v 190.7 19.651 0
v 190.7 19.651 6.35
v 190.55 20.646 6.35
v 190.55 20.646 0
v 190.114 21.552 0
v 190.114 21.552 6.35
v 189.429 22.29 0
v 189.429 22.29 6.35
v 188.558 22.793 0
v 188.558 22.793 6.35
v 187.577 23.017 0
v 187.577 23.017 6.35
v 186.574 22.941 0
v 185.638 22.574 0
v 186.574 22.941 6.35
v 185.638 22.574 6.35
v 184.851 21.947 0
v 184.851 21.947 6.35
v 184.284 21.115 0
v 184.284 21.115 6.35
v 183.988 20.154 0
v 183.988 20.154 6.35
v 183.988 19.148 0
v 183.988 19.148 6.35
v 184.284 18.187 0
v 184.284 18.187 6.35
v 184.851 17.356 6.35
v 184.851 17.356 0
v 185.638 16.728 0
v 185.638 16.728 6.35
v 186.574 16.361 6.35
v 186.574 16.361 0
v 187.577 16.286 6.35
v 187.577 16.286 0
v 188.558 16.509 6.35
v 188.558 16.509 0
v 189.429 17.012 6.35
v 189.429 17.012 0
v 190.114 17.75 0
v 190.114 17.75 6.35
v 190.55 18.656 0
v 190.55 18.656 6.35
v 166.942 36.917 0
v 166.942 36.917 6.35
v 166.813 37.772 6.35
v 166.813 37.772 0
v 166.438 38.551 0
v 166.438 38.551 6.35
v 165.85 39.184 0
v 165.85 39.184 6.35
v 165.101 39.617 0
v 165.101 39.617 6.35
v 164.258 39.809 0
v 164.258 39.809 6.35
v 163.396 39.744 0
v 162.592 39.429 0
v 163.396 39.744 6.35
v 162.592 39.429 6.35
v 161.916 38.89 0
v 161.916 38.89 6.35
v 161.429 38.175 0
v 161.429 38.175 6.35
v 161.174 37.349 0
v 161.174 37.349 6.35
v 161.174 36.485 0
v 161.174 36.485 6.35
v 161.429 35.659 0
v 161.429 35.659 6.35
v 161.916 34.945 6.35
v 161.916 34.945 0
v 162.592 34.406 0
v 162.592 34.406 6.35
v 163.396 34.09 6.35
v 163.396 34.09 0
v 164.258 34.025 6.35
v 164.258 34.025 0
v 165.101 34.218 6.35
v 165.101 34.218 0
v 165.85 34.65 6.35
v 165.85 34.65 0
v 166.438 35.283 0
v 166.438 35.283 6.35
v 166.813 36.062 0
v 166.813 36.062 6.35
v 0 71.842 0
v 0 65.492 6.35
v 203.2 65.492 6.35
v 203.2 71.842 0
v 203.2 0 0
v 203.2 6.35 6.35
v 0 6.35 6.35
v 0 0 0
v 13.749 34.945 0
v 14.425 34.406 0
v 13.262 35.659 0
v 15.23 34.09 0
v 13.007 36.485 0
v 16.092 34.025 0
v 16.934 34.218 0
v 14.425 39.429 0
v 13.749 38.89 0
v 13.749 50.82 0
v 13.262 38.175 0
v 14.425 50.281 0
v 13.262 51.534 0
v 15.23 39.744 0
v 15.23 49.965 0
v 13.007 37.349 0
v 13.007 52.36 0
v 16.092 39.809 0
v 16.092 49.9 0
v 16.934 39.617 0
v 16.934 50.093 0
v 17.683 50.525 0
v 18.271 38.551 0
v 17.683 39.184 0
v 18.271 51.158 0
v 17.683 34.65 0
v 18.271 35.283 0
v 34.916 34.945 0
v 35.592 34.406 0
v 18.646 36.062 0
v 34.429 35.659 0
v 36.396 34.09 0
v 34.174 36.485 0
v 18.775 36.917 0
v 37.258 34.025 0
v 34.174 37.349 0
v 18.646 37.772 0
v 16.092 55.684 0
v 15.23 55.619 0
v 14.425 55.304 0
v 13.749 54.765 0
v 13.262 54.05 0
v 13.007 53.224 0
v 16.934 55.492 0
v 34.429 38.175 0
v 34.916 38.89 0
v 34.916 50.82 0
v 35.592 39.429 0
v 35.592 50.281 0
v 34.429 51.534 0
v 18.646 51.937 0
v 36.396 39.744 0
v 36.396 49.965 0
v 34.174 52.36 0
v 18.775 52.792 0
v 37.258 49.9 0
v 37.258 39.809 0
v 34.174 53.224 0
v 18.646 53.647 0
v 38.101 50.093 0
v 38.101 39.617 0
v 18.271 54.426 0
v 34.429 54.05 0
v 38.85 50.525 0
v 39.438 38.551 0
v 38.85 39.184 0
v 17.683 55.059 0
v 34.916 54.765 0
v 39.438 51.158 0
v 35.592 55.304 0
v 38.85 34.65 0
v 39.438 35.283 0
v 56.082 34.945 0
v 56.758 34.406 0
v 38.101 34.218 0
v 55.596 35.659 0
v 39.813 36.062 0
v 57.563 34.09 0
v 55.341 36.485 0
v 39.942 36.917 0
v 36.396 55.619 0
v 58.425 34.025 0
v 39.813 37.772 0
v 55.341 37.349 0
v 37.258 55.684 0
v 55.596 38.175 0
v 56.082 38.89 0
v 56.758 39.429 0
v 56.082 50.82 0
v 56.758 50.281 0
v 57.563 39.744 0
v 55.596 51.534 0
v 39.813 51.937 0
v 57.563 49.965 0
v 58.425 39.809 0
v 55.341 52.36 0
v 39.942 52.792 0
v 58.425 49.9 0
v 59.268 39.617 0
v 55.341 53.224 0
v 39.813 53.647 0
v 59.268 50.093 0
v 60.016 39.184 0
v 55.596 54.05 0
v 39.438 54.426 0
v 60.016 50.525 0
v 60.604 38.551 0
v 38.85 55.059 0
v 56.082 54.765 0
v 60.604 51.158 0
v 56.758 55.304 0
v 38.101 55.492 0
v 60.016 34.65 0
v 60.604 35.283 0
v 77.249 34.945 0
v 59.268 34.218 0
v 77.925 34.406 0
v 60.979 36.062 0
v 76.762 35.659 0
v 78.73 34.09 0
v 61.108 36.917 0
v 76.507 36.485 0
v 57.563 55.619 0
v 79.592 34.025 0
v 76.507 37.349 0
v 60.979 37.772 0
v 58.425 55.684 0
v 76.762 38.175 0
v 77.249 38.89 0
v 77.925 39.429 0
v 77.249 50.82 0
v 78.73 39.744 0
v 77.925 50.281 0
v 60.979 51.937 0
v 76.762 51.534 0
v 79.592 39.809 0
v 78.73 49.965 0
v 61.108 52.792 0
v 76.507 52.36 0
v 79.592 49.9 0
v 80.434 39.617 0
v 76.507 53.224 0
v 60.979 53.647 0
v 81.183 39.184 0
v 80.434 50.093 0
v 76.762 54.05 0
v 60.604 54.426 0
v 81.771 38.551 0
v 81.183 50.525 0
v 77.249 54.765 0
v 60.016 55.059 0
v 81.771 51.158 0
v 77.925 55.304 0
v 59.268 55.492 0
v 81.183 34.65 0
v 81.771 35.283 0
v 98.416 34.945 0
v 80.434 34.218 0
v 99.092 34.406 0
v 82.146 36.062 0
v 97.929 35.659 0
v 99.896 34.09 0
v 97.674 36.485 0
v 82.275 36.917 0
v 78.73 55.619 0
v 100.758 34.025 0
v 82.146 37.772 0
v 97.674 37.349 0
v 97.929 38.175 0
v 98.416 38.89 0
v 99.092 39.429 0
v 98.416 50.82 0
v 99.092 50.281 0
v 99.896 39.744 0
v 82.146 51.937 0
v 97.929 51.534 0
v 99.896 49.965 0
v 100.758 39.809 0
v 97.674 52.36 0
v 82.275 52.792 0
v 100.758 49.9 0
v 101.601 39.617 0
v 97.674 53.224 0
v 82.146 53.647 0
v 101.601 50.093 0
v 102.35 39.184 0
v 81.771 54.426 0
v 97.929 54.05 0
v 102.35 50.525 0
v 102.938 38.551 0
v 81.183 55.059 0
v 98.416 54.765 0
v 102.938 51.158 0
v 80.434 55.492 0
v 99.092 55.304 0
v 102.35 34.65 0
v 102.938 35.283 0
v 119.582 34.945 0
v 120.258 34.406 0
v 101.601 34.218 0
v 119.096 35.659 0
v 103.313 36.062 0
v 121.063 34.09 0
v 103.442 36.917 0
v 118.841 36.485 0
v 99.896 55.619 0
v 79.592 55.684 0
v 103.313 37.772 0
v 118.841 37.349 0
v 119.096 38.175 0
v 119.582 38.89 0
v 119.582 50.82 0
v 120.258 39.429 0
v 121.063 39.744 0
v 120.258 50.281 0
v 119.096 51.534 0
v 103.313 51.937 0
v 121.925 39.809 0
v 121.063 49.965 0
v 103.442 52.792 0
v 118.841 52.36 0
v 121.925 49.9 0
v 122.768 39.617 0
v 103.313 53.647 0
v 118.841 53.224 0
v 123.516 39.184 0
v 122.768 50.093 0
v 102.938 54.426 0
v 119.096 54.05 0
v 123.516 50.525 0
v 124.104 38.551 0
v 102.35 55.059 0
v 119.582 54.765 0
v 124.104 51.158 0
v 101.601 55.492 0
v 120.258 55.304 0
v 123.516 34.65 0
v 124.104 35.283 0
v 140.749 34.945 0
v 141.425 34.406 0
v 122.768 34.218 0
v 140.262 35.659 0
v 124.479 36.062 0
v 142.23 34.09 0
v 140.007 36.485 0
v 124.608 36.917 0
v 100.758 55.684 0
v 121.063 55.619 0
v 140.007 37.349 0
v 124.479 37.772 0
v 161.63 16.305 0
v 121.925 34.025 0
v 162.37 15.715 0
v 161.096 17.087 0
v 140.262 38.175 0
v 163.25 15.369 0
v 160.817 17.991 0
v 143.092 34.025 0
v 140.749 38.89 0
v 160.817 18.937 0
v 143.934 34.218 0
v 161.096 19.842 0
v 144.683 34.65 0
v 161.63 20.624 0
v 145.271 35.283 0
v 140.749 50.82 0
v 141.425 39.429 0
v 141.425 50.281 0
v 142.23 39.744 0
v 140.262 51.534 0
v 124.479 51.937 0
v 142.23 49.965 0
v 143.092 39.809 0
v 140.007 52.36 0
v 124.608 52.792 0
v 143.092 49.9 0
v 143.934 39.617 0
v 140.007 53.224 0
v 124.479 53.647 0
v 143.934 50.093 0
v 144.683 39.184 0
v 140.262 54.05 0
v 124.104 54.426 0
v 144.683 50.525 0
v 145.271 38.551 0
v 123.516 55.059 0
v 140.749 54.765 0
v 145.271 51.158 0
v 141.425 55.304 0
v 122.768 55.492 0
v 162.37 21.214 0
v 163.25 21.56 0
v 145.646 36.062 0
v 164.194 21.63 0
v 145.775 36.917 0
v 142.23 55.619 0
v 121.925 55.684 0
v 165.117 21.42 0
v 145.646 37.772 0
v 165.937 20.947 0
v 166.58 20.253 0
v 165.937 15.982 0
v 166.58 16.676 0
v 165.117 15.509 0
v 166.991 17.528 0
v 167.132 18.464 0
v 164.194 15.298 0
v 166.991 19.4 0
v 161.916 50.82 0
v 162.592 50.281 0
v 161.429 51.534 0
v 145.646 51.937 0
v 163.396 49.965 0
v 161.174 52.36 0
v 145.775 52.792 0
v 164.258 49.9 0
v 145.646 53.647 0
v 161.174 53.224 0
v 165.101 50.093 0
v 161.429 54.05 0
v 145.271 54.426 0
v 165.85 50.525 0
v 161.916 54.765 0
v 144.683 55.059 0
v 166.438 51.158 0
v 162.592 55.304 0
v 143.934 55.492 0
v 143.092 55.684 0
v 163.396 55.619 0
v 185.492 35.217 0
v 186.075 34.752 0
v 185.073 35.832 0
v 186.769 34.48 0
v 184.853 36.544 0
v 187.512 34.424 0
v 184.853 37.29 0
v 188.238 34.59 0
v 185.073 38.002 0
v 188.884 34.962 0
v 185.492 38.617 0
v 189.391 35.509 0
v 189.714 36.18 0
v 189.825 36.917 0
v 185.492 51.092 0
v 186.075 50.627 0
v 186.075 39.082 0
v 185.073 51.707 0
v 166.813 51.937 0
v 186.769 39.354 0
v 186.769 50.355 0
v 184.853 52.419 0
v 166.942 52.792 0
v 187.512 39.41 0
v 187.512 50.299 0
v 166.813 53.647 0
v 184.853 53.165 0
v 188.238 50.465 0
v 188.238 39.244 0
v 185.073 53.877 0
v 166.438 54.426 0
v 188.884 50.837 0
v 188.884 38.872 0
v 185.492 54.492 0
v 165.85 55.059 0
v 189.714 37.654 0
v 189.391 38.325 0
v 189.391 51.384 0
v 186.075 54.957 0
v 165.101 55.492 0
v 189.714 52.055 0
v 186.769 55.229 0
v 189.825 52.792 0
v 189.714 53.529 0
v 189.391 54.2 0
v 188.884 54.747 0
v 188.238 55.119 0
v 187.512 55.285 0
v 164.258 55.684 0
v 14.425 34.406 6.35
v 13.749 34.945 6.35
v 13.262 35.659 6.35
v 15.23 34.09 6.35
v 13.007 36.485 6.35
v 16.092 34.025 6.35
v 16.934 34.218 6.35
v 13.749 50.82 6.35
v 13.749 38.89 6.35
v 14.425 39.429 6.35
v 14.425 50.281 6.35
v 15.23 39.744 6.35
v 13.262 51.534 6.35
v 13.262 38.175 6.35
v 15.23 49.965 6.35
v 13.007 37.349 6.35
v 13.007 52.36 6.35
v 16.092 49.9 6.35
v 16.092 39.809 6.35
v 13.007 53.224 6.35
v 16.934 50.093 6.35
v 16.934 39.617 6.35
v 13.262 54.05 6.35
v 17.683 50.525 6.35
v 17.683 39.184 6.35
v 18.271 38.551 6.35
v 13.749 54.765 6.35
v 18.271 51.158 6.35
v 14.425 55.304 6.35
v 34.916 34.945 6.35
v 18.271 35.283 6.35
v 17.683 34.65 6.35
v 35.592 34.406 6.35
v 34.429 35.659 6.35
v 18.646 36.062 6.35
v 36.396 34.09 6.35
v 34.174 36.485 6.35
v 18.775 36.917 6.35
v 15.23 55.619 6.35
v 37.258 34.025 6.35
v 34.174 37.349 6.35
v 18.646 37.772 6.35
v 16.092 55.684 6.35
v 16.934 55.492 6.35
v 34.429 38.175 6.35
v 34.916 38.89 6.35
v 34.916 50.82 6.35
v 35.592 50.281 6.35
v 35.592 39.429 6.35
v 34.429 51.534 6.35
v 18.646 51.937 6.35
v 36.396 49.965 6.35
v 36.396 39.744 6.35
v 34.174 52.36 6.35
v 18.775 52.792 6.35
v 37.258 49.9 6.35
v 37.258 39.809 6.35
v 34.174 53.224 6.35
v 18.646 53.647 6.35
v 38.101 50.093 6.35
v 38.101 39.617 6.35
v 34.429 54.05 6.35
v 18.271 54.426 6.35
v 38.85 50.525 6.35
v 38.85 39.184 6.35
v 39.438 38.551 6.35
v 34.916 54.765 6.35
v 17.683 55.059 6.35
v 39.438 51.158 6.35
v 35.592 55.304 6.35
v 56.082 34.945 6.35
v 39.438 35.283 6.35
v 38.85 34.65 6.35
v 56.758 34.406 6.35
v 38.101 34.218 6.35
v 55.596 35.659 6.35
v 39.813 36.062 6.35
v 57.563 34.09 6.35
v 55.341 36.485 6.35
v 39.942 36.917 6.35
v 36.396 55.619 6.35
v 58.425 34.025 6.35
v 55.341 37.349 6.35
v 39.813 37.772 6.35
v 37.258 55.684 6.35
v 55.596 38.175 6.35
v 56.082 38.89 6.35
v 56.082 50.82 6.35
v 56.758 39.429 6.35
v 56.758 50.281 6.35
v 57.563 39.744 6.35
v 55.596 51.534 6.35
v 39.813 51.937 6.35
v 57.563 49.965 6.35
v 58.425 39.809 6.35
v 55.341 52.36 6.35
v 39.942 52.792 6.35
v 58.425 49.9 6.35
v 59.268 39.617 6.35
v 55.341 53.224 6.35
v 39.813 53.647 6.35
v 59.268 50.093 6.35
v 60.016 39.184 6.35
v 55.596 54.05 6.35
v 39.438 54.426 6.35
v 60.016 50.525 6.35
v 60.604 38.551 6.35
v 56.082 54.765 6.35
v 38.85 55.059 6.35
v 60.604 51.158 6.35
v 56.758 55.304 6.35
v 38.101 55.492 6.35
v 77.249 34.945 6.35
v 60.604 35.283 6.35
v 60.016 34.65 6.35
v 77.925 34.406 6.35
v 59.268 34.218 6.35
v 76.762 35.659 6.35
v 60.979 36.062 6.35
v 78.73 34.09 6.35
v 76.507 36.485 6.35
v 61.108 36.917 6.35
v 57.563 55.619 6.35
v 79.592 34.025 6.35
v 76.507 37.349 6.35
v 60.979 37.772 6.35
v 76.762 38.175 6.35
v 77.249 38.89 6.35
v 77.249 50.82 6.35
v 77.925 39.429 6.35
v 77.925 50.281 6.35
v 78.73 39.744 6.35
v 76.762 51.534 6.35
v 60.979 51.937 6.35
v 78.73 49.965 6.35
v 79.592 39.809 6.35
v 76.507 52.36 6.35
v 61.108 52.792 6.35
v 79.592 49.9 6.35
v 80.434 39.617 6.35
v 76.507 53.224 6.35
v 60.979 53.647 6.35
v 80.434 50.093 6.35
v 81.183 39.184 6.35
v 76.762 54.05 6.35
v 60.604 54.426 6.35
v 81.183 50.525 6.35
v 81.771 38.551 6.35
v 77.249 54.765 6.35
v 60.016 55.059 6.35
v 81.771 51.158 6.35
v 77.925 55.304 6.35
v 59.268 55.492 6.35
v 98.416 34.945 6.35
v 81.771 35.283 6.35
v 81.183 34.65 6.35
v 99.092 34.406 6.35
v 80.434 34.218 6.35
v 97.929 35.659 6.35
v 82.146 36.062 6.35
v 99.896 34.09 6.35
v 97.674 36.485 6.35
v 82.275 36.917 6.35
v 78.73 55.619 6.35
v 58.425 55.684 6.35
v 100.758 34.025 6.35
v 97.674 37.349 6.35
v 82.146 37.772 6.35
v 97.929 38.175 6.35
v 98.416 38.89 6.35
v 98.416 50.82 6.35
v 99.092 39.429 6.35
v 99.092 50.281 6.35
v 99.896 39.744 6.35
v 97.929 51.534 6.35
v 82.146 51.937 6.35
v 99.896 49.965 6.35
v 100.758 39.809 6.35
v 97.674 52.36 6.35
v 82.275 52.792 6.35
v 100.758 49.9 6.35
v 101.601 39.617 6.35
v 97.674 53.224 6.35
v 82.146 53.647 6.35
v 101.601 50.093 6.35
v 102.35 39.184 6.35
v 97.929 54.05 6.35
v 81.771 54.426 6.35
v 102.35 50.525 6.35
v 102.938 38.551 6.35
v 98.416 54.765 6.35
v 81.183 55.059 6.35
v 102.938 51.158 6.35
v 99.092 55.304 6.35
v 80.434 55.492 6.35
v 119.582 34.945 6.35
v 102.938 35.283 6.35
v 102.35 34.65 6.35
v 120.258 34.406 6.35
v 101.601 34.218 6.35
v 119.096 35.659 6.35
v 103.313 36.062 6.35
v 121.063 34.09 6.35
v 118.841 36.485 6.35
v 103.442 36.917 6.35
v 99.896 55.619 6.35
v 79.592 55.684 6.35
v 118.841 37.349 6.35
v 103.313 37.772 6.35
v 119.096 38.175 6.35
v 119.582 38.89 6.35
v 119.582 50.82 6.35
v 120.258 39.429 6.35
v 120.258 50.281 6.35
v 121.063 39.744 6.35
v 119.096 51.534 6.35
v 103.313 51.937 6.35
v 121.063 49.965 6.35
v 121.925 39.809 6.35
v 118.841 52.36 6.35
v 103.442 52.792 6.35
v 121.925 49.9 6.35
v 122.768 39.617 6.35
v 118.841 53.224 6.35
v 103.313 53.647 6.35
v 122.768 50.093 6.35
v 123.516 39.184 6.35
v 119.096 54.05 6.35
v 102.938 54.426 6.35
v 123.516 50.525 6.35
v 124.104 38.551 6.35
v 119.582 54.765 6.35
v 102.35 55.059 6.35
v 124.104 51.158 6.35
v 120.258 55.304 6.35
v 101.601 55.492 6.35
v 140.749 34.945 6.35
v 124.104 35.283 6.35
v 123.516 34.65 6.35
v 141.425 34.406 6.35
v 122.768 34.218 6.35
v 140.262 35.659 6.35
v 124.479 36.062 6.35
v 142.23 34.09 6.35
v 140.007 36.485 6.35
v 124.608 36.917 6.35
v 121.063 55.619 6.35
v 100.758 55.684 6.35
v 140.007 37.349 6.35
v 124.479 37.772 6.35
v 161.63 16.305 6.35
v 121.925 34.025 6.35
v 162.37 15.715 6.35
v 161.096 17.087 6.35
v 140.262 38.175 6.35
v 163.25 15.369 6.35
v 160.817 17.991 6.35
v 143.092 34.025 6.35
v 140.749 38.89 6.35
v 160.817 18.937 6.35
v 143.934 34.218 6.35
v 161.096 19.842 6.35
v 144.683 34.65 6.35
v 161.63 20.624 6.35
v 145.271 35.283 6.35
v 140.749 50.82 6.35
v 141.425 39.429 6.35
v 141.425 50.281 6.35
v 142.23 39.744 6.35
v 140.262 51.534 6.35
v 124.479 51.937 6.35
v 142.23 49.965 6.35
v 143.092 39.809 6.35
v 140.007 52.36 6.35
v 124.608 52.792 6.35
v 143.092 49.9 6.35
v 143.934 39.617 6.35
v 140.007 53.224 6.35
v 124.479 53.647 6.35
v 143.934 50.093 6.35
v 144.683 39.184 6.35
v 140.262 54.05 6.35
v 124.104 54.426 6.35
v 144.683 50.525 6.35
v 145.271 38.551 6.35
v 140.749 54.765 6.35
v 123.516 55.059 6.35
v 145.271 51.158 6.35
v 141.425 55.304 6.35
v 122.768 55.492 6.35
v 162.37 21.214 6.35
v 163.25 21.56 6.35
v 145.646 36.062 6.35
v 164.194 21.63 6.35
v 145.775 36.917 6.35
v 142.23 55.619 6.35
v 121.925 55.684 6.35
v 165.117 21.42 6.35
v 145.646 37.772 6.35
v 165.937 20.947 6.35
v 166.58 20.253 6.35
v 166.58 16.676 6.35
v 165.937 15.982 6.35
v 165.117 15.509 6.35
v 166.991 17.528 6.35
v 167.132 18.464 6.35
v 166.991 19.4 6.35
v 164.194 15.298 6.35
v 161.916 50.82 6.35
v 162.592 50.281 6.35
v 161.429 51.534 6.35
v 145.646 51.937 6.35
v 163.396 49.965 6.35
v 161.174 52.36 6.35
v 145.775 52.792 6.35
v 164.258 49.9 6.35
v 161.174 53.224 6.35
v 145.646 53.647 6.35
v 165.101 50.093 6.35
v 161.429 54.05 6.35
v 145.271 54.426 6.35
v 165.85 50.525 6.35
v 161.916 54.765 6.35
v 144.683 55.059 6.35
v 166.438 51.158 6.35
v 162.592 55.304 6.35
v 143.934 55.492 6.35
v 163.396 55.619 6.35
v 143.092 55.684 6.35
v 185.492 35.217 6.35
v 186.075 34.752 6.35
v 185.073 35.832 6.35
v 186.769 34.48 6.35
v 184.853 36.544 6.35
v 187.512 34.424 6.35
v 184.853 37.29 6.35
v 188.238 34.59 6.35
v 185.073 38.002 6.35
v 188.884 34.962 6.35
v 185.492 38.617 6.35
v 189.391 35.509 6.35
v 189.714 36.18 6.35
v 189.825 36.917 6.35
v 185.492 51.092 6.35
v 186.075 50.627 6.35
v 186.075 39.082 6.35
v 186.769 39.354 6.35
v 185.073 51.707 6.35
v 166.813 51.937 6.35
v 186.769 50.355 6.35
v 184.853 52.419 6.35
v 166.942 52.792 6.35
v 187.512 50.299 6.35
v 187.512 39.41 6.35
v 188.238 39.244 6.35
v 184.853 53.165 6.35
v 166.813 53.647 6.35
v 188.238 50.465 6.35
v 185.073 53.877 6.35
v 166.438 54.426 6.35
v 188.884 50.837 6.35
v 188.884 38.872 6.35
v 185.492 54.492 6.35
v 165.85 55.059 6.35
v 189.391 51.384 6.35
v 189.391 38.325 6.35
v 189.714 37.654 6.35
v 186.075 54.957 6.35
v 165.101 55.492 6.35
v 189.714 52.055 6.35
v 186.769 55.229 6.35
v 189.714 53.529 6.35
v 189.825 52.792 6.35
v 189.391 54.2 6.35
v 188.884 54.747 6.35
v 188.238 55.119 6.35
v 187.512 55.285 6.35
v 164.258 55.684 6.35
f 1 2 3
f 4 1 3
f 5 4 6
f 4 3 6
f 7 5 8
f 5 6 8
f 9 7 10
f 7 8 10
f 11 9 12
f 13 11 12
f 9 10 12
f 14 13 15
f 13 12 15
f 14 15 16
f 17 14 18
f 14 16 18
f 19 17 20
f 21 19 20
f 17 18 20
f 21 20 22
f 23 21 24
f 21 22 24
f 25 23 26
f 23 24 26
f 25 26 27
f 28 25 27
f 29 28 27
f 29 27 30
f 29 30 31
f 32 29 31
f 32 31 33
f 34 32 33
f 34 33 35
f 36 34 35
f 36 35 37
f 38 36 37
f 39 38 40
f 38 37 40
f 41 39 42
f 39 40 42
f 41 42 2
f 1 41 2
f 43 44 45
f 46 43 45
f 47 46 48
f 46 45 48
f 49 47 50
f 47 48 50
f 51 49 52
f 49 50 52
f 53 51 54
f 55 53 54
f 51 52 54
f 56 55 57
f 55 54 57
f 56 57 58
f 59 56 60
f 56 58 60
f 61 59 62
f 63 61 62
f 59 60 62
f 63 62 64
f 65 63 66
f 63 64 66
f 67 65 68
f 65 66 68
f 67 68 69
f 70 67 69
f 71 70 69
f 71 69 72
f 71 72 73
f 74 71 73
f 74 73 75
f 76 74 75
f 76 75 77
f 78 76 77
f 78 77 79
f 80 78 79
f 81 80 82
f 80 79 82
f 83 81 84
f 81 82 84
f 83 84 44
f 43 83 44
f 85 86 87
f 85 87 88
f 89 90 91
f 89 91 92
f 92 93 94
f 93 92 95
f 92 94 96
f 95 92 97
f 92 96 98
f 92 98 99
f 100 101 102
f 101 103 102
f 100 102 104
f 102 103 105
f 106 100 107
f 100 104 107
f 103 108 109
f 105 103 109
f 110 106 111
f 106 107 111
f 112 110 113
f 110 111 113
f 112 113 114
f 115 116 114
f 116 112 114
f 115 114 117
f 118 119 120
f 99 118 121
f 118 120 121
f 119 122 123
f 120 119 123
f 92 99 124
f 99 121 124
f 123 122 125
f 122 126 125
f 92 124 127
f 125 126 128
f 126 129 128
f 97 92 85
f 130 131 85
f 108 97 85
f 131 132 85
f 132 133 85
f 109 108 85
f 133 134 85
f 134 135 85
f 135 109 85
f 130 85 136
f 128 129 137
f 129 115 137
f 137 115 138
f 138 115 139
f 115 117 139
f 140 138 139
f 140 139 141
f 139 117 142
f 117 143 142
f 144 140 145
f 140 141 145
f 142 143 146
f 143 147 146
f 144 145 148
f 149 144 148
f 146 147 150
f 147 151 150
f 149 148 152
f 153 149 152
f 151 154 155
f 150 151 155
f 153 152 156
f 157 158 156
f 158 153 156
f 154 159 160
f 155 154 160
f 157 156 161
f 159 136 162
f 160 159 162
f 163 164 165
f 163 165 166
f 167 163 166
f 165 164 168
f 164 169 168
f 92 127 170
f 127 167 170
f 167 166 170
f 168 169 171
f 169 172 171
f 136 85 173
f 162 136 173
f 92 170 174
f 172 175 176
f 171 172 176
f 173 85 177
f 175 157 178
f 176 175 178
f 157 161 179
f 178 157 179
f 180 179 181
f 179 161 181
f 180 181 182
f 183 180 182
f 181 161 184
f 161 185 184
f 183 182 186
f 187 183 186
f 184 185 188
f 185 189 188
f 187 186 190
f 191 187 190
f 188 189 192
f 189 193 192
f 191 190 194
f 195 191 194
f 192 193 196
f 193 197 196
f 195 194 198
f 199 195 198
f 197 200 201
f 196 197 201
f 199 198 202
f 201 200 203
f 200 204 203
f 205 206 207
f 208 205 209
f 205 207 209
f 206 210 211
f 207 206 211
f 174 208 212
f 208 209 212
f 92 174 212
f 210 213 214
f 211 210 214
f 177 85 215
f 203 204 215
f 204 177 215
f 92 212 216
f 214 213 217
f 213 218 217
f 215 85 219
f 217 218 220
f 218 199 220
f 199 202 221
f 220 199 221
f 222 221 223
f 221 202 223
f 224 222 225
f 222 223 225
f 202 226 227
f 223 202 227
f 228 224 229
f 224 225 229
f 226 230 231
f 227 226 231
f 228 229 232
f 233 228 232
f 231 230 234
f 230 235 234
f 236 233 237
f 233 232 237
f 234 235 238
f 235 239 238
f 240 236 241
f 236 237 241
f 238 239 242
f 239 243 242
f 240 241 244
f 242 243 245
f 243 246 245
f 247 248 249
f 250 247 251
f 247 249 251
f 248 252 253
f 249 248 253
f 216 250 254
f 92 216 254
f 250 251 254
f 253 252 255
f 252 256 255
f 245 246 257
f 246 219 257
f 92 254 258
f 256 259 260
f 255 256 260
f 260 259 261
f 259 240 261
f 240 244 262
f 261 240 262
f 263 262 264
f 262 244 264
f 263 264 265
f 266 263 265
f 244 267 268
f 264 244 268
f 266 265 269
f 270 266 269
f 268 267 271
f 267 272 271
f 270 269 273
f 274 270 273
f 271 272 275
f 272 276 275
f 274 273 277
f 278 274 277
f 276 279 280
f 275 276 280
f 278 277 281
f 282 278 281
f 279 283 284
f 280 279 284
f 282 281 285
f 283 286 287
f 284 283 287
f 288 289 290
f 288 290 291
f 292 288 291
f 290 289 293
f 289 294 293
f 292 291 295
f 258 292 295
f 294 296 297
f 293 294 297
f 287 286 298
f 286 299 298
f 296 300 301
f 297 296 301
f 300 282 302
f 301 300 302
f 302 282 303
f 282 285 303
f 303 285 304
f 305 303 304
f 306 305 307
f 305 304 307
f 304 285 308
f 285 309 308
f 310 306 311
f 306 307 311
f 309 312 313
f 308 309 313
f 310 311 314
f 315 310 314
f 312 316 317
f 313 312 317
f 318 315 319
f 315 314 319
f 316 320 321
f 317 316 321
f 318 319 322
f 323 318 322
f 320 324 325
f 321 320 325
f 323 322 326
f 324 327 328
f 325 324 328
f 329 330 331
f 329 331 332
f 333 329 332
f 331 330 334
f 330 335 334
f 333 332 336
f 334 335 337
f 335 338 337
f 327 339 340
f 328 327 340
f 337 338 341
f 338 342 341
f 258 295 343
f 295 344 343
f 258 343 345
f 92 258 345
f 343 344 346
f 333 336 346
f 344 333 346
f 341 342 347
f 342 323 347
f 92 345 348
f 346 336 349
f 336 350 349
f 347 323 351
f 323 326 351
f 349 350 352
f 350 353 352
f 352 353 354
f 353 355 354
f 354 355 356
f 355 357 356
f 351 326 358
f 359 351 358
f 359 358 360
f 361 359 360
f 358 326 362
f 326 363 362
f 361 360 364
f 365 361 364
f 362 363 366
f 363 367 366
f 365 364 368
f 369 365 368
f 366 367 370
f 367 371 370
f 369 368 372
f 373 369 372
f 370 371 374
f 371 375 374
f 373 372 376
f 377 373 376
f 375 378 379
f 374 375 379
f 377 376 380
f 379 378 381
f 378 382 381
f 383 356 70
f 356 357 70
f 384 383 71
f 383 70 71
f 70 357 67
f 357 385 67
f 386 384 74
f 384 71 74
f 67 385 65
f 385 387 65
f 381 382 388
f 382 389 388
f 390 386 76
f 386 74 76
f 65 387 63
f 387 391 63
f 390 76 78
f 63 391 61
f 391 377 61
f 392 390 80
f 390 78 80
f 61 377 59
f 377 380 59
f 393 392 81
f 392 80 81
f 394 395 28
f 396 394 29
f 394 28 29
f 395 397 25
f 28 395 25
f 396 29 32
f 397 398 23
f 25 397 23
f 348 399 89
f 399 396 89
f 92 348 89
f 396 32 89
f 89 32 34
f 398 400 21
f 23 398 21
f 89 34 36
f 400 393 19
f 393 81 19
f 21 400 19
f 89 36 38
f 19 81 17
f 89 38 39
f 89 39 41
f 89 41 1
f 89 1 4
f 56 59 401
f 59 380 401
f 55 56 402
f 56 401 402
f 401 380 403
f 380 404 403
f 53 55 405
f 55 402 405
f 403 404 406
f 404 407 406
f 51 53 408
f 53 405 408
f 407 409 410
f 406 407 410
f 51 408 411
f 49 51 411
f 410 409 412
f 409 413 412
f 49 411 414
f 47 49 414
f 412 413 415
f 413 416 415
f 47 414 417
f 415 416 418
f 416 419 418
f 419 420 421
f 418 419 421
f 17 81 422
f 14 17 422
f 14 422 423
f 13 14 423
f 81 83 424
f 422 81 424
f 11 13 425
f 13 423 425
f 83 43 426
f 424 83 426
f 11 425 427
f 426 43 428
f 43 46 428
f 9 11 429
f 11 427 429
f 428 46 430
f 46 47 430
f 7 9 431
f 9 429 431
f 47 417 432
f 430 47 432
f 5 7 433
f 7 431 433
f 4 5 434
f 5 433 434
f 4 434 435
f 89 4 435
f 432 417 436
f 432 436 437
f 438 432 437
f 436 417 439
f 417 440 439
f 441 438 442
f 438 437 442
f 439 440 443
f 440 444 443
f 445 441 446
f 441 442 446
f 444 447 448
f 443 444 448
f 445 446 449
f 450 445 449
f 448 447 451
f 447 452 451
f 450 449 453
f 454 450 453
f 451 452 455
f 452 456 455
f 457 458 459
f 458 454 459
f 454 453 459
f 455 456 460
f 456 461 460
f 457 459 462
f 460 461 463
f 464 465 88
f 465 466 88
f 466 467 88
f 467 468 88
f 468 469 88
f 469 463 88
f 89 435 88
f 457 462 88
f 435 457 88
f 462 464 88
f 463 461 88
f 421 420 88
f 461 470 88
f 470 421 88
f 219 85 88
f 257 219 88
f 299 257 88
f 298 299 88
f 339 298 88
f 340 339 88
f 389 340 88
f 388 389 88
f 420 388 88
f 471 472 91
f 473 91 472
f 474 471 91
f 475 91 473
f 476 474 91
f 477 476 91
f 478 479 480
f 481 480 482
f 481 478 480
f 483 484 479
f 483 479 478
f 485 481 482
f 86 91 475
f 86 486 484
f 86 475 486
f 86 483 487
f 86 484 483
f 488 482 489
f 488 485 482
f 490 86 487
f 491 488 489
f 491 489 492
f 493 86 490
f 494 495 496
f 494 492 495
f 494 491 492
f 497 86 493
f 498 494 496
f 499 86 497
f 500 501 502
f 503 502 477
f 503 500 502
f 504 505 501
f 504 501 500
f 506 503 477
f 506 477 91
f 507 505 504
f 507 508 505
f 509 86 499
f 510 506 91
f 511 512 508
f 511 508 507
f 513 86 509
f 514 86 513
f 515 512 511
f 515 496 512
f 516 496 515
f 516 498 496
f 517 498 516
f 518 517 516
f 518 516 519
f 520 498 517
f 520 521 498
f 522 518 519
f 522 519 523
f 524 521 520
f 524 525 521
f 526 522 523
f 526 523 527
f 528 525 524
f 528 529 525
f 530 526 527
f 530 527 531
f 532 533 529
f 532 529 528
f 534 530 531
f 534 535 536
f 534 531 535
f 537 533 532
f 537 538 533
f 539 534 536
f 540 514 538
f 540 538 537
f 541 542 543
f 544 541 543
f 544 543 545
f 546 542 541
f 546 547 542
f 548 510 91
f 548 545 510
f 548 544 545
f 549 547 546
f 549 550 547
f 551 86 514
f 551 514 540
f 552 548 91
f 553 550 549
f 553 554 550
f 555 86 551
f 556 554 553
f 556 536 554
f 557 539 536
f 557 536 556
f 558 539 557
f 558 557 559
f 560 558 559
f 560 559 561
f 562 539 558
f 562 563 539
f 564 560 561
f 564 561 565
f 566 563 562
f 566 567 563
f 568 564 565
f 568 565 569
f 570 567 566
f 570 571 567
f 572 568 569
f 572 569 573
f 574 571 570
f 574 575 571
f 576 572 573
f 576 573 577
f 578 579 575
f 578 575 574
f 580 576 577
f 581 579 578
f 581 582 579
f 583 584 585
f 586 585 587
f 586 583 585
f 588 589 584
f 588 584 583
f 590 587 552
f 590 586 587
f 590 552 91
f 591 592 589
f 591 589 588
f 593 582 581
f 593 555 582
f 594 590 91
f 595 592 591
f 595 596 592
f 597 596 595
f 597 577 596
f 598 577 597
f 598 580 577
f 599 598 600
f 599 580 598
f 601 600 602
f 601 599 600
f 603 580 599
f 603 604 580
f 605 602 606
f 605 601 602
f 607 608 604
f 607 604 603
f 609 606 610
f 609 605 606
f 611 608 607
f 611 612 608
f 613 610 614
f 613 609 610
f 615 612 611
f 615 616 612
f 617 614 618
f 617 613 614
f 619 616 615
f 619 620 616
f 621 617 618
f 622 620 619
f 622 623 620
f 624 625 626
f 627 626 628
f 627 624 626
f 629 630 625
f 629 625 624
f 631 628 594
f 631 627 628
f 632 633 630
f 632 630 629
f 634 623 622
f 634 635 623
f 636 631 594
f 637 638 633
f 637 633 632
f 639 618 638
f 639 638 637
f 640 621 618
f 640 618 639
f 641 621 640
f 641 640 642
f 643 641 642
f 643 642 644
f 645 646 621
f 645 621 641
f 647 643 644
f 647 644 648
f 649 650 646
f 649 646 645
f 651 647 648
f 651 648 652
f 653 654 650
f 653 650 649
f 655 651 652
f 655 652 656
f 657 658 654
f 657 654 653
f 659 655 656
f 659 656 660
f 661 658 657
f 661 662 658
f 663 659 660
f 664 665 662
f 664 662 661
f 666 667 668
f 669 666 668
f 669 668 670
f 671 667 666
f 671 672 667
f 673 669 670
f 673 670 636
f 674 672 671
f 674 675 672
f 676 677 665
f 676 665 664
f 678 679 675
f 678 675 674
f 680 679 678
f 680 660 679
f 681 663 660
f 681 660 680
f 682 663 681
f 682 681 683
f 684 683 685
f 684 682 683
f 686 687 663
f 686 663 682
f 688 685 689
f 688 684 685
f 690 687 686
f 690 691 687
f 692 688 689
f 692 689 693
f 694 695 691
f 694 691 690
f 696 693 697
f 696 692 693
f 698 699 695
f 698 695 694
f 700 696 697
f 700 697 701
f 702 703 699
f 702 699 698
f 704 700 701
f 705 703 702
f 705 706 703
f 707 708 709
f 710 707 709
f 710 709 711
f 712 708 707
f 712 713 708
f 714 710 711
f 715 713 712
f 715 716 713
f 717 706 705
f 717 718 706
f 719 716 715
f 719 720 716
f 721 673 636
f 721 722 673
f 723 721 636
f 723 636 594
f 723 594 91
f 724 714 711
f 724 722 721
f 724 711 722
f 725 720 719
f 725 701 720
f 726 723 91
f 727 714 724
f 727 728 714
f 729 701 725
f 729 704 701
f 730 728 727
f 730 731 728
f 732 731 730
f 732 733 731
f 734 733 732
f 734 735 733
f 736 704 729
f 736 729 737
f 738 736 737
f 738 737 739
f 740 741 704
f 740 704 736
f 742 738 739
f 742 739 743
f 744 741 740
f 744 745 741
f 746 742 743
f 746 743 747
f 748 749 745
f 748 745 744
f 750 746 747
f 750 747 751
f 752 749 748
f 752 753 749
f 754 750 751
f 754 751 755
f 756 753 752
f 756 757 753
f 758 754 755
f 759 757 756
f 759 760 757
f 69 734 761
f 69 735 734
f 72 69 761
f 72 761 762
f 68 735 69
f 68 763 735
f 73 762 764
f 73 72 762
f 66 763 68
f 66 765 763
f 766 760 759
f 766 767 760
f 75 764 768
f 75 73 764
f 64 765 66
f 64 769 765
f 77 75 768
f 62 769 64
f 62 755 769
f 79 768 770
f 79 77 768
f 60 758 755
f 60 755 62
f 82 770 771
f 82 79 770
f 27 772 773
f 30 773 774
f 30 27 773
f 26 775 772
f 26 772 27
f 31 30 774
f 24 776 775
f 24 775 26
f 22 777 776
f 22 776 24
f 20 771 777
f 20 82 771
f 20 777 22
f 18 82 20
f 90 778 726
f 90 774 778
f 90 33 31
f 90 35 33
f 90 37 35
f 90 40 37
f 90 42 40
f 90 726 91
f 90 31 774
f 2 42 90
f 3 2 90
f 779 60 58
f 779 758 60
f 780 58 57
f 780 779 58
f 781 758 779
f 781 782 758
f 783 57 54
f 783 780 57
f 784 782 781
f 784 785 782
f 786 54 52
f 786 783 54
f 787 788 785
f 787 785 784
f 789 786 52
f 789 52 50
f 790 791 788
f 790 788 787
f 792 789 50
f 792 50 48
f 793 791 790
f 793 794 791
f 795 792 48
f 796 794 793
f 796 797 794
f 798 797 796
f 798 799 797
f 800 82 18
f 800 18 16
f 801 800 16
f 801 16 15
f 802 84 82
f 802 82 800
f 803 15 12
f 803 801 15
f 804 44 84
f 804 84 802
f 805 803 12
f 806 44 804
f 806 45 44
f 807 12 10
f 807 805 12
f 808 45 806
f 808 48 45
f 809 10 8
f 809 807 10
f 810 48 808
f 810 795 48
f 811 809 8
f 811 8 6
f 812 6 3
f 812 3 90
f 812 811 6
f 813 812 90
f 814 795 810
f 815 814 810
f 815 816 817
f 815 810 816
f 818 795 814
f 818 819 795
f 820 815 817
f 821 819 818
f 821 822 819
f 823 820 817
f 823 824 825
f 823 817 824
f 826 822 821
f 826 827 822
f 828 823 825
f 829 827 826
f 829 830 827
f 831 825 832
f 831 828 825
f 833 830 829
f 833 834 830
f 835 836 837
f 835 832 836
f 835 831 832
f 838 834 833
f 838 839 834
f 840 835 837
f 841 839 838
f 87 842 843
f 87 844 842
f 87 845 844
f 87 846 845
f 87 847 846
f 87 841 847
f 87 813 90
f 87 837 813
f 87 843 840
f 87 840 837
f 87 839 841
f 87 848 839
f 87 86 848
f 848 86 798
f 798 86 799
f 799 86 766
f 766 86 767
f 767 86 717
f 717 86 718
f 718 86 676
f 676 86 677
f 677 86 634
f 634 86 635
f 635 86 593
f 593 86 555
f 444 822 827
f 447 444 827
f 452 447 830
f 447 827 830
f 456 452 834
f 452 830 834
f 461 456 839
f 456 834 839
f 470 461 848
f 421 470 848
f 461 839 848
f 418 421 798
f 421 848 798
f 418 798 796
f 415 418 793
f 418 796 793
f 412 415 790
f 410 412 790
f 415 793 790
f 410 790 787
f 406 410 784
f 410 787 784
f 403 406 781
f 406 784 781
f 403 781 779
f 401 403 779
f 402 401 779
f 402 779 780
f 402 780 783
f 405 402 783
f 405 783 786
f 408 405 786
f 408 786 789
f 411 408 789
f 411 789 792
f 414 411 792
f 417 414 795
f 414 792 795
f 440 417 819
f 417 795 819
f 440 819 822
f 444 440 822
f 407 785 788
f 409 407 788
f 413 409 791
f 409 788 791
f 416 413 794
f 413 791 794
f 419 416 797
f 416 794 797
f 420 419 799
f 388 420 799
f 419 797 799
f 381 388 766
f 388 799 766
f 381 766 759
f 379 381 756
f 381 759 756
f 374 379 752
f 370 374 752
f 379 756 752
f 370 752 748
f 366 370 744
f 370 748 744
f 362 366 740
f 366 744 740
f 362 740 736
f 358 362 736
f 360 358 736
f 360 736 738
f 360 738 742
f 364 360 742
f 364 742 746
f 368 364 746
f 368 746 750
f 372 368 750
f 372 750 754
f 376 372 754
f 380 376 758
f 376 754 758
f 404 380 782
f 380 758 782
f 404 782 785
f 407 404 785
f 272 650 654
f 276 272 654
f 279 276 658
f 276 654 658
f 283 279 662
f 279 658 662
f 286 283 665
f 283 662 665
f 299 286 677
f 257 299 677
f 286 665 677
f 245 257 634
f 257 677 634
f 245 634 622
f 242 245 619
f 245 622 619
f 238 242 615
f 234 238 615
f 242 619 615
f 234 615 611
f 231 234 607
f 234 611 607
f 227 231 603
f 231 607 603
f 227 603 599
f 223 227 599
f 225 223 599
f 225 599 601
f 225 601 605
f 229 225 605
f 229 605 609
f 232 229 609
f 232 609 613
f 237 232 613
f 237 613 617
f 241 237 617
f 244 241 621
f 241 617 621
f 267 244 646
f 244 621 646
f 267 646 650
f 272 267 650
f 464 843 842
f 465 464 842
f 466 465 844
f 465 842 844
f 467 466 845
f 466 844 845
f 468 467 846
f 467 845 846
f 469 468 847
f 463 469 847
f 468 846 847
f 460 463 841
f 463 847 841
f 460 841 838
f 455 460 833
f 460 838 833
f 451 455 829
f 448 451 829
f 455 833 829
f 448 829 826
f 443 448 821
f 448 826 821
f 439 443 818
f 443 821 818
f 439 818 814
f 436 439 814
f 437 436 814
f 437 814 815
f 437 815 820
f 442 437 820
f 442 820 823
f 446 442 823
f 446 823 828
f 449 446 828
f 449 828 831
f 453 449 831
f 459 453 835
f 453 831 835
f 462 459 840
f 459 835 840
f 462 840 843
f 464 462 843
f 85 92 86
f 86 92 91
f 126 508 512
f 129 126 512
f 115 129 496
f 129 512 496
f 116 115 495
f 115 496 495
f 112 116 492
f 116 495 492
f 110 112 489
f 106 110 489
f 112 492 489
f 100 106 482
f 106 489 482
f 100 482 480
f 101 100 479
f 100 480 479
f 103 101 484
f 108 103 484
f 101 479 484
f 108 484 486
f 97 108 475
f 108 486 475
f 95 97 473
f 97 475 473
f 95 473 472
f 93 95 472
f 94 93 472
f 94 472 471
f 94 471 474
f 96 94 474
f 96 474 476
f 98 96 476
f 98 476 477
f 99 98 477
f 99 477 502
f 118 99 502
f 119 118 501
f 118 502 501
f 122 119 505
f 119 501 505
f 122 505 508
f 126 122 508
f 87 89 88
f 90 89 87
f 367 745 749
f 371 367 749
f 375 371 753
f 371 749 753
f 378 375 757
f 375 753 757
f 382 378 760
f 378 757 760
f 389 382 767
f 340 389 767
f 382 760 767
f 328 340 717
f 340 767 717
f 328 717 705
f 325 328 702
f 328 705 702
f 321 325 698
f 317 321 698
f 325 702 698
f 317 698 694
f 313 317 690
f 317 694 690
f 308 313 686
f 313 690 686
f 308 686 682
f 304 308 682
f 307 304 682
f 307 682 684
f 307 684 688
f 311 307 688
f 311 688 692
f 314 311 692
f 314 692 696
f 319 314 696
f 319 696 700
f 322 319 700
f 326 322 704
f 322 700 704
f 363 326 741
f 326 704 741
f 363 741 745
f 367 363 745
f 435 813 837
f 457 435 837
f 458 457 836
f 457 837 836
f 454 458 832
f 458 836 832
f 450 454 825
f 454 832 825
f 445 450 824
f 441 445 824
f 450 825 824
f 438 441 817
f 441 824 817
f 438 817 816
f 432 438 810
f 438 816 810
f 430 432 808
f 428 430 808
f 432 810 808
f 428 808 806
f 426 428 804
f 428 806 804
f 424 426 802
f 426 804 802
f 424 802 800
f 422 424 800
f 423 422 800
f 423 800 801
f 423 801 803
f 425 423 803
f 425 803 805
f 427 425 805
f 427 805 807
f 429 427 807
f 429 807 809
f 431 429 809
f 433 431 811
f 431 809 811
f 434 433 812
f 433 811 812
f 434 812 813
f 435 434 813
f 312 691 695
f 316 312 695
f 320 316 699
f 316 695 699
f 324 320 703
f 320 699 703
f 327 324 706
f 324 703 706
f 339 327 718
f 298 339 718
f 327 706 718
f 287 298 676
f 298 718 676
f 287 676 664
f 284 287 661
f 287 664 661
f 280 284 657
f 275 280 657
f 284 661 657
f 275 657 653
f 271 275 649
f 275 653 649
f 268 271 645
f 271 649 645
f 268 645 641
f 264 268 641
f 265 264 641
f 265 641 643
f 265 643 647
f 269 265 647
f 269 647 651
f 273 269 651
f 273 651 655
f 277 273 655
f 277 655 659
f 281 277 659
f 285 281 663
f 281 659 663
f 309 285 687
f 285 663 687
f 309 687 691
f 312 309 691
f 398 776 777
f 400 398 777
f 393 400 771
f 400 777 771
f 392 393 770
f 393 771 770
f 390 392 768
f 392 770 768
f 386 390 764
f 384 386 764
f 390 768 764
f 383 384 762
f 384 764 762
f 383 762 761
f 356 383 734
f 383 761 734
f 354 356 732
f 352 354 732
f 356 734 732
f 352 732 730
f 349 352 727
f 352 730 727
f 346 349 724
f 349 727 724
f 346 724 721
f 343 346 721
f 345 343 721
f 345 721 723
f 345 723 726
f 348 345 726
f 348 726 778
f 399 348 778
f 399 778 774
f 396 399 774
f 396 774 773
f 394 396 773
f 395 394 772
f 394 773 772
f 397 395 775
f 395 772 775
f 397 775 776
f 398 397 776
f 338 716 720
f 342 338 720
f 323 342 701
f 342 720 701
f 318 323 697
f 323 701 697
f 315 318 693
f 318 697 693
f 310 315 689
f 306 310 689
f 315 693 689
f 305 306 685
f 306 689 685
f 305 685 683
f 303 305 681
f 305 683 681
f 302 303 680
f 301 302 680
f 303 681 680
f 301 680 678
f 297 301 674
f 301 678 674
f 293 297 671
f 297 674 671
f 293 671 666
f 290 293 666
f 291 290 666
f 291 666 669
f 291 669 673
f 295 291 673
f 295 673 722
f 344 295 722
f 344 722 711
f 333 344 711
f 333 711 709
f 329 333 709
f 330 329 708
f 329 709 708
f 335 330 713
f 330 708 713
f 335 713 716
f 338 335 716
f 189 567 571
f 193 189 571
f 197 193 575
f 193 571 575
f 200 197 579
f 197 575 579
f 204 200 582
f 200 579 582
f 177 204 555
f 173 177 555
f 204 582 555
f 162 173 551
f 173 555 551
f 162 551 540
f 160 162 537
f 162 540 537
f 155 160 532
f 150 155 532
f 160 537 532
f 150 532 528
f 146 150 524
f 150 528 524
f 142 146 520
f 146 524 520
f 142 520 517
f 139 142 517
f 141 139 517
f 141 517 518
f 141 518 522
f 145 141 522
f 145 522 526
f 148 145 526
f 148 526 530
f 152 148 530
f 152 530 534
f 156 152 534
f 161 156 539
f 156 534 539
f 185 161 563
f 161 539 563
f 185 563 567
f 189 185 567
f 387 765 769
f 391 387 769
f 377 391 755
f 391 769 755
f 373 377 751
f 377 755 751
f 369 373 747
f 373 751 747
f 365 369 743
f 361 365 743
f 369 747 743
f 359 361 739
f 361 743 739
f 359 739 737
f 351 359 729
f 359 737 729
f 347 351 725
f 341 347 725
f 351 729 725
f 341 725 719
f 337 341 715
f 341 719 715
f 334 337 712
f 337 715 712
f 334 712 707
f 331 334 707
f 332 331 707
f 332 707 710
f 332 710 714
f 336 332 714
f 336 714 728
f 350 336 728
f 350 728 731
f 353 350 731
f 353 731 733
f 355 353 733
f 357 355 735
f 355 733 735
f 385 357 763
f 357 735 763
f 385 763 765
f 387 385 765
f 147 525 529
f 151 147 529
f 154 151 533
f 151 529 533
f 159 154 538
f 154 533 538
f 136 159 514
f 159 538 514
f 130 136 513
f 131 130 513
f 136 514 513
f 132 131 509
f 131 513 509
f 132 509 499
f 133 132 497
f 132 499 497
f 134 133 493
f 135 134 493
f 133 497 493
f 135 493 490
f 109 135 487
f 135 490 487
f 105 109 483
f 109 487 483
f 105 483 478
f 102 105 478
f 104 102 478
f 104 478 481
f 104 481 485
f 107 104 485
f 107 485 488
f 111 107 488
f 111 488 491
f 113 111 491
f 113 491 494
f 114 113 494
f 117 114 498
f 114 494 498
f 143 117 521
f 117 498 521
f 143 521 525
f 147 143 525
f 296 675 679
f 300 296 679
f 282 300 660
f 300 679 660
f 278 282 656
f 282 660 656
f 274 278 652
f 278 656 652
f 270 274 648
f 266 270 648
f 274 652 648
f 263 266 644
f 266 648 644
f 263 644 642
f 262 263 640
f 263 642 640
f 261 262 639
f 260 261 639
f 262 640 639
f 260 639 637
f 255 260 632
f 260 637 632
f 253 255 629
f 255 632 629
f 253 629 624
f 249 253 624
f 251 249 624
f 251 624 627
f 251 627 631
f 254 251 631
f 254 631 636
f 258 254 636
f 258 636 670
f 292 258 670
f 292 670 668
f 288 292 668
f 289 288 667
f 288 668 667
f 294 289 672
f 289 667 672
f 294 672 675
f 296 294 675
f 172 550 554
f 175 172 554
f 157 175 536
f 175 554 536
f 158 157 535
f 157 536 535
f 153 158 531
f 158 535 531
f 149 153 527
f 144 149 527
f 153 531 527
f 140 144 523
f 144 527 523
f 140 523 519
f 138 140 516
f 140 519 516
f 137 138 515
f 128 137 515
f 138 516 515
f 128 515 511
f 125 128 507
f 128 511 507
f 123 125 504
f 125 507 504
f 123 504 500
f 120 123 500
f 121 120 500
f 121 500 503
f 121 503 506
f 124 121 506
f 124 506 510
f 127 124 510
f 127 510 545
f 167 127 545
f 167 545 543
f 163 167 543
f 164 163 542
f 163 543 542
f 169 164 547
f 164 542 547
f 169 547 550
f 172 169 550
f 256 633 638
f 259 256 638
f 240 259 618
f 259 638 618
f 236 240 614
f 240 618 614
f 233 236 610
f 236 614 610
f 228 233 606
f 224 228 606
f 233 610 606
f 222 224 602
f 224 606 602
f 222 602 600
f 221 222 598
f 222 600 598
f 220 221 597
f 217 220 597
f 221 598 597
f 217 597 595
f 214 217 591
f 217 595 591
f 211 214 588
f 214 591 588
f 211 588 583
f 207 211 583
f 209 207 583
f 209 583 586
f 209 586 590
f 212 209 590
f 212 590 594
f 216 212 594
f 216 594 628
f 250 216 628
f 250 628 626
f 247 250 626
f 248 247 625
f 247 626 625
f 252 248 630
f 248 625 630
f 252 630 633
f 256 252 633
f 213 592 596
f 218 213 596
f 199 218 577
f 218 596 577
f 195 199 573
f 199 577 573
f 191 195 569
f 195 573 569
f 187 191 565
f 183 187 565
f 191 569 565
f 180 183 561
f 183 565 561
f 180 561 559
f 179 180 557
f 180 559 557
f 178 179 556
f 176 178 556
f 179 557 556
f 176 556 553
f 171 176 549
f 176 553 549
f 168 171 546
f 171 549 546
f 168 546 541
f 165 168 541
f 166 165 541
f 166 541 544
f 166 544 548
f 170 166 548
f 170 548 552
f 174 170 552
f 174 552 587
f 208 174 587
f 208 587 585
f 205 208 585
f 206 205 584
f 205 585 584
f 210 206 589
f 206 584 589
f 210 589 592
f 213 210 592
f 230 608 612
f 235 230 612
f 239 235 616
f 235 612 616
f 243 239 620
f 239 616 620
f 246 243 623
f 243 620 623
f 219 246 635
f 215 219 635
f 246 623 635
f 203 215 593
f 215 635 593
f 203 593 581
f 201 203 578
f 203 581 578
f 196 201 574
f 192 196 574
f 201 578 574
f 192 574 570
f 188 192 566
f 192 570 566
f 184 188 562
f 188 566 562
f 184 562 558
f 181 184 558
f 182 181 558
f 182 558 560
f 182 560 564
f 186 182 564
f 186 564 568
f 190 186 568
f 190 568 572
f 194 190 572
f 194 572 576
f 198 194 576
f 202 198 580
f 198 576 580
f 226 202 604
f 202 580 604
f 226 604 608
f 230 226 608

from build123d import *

# Parameters (mm, degrees)
SKETCH2_W                 = 203.2
SKETCH2_H                 = 71.842048969
BOSS_EXTRUDE1_DEPTH       = 6.35
CUT_EXTRUDE1_DEPTH        = 203.2
CUT_EXTRUDE3_DEPTH        = 203.2
SKETCH7_R                 = 2.9
CUT_EXTRUDE4_DEPTH        = 6.35
LPATTERN1_COUNT           = 8
LPATTERN1_PITCH           = 21.166666667
LPATTERN2_COUNT           = 2
LPATTERN2_PITCH           = 15.875
LPATTERN2_COPY_1_SKETCH_R = 2.9
LPATTERN2_COPY_1_DEPTH    = 6.35
LPATTERN2_COPY_2_SKETCH_R = 2.9
LPATTERN2_COPY_2_DEPTH    = 6.35
LPATTERN2_COPY_3_SKETCH_R = 2.9
LPATTERN2_COPY_3_DEPTH    = 6.35
LPATTERN2_COPY_4_SKETCH_R = 2.9
LPATTERN2_COPY_4_DEPTH    = 6.35
LPATTERN2_COPY_5_SKETCH_R = 2.9
LPATTERN2_COPY_5_DEPTH    = 6.35
LPATTERN2_COPY_6_SKETCH_R = 2.9
LPATTERN2_COPY_6_DEPTH    = 6.35
LPATTERN2_COPY_7_SKETCH_R = 2.9
LPATTERN2_COPY_7_DEPTH    = 6.35
SKETCH8_R                 = 2.5
CUT_EXTRUDE5_DEPTH        = 6.35
LPATTERN3_COUNT           = 2
LPATTERN3_PITCH           = 15.875
SKETCH9_R                 = 3.375
CUT_EXTRUDE6_DEPTH        = 6.35
SKETCH12_R                = 3.175
CUT_EXTRUDE7_DEPTH        = 6.35


with BuildPart() as part:
    # Sketch2 → Boss-Extrude1 (new body)
    with BuildSketch(Plane.XY):
        with Locations((101.6, 35.921024485)):
            Rectangle(SKETCH2_W, SKETCH2_H)
    extrude(amount=BOSS_EXTRUDE1_DEPTH)

    # Sketch3 → Cut-Extrude1 (cut)
    with BuildSketch(Plane.ZY):
        Polygon((0, 0), (6.35, 0), (6.35, 6.35), align=None)
    extrude(amount=-CUT_EXTRUDE1_DEPTH, mode=Mode.SUBTRACT)

    # Sketch5 → Cut-Extrude3 (cut)
    with BuildSketch(Plane.ZY):
        Polygon((6.35, 71.842048969), (6.35, 65.492048969), (0, 71.842048969), align=None)
    extrude(amount=-CUT_EXTRUDE3_DEPTH, mode=Mode.SUBTRACT)

    # Sketch7 → Cut-Extrude4 (cut)
    with BuildSketch(Plane.XY.offset(6.35)):
        with Locations((15.875, 52.792048969)):
            Circle(SKETCH7_R)
    cut_extrude4 = extrude(amount=-CUT_EXTRUDE4_DEPTH, mode=Mode.SUBTRACT)

    # LPattern1: Cut-Extrude4 ×8
    with Locations(*[(i * LPATTERN1_PITCH, 0, 0) for i in range(1, LPATTERN1_COUNT)]):
        add(cut_extrude4, mode=Mode.SUBTRACT)

    # LPattern2: Cut-Extrude4 ×2
    with Locations(*[(0, -i * LPATTERN2_PITCH, 0) for i in range(1, LPATTERN2_COUNT)]):
        add(cut_extrude4, mode=Mode.SUBTRACT)

    # LPattern2 copy 1 sketch → LPattern2 copy 1 (cut)
    with BuildSketch(Plane(origin=(21.166666667, -15.875, 6.35), x_dir=(1, 0, 0), z_dir=(0, 0, 1))):
        with Locations((15.875, 52.792048969)):
            Circle(LPATTERN2_COPY_1_SKETCH_R)
    extrude(amount=-LPATTERN2_COPY_1_DEPTH, mode=Mode.SUBTRACT)

    # LPattern2 copy 2 sketch → LPattern2 copy 2 (cut)
    with BuildSketch(Plane(origin=(42.333333333, -15.875, 6.35), x_dir=(1, 0, 0), z_dir=(0, 0, 1))):
        with Locations((15.875, 52.792048969)):
            Circle(LPATTERN2_COPY_2_SKETCH_R)
    extrude(amount=-LPATTERN2_COPY_2_DEPTH, mode=Mode.SUBTRACT)

    # LPattern2 copy 3 sketch → LPattern2 copy 3 (cut)
    with BuildSketch(Plane(origin=(63.5, -15.875, 6.35), x_dir=(1, 0, 0), z_dir=(0, 0, 1))):
        with Locations((15.875, 52.792048969)):
            Circle(LPATTERN2_COPY_3_SKETCH_R)
    extrude(amount=-LPATTERN2_COPY_3_DEPTH, mode=Mode.SUBTRACT)

    # LPattern2 copy 4 sketch → LPattern2 copy 4 (cut)
    with BuildSketch(Plane(origin=(84.666666667, -15.875, 6.35), x_dir=(1, 0, 0), z_dir=(0, 0, 1))):
        with Locations((15.875, 52.792048969)):
            Circle(LPATTERN2_COPY_4_SKETCH_R)
    extrude(amount=-LPATTERN2_COPY_4_DEPTH, mode=Mode.SUBTRACT)

    # LPattern2 copy 5 sketch → LPattern2 copy 5 (cut)
    with BuildSketch(Plane(origin=(105.833333333, -15.875, 6.35), x_dir=(1, 0, 0), z_dir=(0, 0, 1))):
        with Locations((15.875, 52.792048969)):
            Circle(LPATTERN2_COPY_5_SKETCH_R)
    extrude(amount=-LPATTERN2_COPY_5_DEPTH, mode=Mode.SUBTRACT)

    # LPattern2 copy 6 sketch → LPattern2 copy 6 (cut)
    with BuildSketch(Plane(origin=(127, -15.875, 6.35), x_dir=(1, 0, 0), z_dir=(0, 0, 1))):
        with Locations((15.875, 52.792048969)):
            Circle(LPATTERN2_COPY_6_SKETCH_R)
    extrude(amount=-LPATTERN2_COPY_6_DEPTH, mode=Mode.SUBTRACT)

    # LPattern2 copy 7 sketch → LPattern2 copy 7 (cut)
    with BuildSketch(Plane(origin=(148.166666667, -15.875, 6.35), x_dir=(1, 0, 0), z_dir=(0, 0, 1))):
        with Locations((15.875, 52.792048969)):
            Circle(LPATTERN2_COPY_7_SKETCH_R)
    extrude(amount=-LPATTERN2_COPY_7_DEPTH, mode=Mode.SUBTRACT)

    # Sketch8 → Cut-Extrude5 (cut)
    with BuildSketch(Plane.XY.offset(6.35)):
        with Locations((187.325, 52.792048969)):
            Circle(SKETCH8_R)
    cut_extrude5 = extrude(amount=-CUT_EXTRUDE5_DEPTH, mode=Mode.SUBTRACT)

    # LPattern3: Cut-Extrude5 ×2
    with Locations(*[(0, -i * LPATTERN3_PITCH, 0) for i in range(1, LPATTERN3_COUNT)]):
        add(cut_extrude5, mode=Mode.SUBTRACT)

    # Sketch9 → Cut-Extrude6 (cut)
    with BuildSketch(Plane.XY.offset(6.35)):
        with Locations((187.325, 19.651113798)):
            Circle(SKETCH9_R)
    extrude(amount=-CUT_EXTRUDE6_DEPTH, mode=Mode.SUBTRACT)

    # Sketch12 → Cut-Extrude7 (cut)
    with BuildSketch(Plane.XY.offset(6.35)):
        with Locations((163.957, 18.464225693)):
            Circle(SKETCH12_R)
    extrude(amount=-CUT_EXTRUDE7_DEPTH, mode=Mode.SUBTRACT)


solid = part.part
